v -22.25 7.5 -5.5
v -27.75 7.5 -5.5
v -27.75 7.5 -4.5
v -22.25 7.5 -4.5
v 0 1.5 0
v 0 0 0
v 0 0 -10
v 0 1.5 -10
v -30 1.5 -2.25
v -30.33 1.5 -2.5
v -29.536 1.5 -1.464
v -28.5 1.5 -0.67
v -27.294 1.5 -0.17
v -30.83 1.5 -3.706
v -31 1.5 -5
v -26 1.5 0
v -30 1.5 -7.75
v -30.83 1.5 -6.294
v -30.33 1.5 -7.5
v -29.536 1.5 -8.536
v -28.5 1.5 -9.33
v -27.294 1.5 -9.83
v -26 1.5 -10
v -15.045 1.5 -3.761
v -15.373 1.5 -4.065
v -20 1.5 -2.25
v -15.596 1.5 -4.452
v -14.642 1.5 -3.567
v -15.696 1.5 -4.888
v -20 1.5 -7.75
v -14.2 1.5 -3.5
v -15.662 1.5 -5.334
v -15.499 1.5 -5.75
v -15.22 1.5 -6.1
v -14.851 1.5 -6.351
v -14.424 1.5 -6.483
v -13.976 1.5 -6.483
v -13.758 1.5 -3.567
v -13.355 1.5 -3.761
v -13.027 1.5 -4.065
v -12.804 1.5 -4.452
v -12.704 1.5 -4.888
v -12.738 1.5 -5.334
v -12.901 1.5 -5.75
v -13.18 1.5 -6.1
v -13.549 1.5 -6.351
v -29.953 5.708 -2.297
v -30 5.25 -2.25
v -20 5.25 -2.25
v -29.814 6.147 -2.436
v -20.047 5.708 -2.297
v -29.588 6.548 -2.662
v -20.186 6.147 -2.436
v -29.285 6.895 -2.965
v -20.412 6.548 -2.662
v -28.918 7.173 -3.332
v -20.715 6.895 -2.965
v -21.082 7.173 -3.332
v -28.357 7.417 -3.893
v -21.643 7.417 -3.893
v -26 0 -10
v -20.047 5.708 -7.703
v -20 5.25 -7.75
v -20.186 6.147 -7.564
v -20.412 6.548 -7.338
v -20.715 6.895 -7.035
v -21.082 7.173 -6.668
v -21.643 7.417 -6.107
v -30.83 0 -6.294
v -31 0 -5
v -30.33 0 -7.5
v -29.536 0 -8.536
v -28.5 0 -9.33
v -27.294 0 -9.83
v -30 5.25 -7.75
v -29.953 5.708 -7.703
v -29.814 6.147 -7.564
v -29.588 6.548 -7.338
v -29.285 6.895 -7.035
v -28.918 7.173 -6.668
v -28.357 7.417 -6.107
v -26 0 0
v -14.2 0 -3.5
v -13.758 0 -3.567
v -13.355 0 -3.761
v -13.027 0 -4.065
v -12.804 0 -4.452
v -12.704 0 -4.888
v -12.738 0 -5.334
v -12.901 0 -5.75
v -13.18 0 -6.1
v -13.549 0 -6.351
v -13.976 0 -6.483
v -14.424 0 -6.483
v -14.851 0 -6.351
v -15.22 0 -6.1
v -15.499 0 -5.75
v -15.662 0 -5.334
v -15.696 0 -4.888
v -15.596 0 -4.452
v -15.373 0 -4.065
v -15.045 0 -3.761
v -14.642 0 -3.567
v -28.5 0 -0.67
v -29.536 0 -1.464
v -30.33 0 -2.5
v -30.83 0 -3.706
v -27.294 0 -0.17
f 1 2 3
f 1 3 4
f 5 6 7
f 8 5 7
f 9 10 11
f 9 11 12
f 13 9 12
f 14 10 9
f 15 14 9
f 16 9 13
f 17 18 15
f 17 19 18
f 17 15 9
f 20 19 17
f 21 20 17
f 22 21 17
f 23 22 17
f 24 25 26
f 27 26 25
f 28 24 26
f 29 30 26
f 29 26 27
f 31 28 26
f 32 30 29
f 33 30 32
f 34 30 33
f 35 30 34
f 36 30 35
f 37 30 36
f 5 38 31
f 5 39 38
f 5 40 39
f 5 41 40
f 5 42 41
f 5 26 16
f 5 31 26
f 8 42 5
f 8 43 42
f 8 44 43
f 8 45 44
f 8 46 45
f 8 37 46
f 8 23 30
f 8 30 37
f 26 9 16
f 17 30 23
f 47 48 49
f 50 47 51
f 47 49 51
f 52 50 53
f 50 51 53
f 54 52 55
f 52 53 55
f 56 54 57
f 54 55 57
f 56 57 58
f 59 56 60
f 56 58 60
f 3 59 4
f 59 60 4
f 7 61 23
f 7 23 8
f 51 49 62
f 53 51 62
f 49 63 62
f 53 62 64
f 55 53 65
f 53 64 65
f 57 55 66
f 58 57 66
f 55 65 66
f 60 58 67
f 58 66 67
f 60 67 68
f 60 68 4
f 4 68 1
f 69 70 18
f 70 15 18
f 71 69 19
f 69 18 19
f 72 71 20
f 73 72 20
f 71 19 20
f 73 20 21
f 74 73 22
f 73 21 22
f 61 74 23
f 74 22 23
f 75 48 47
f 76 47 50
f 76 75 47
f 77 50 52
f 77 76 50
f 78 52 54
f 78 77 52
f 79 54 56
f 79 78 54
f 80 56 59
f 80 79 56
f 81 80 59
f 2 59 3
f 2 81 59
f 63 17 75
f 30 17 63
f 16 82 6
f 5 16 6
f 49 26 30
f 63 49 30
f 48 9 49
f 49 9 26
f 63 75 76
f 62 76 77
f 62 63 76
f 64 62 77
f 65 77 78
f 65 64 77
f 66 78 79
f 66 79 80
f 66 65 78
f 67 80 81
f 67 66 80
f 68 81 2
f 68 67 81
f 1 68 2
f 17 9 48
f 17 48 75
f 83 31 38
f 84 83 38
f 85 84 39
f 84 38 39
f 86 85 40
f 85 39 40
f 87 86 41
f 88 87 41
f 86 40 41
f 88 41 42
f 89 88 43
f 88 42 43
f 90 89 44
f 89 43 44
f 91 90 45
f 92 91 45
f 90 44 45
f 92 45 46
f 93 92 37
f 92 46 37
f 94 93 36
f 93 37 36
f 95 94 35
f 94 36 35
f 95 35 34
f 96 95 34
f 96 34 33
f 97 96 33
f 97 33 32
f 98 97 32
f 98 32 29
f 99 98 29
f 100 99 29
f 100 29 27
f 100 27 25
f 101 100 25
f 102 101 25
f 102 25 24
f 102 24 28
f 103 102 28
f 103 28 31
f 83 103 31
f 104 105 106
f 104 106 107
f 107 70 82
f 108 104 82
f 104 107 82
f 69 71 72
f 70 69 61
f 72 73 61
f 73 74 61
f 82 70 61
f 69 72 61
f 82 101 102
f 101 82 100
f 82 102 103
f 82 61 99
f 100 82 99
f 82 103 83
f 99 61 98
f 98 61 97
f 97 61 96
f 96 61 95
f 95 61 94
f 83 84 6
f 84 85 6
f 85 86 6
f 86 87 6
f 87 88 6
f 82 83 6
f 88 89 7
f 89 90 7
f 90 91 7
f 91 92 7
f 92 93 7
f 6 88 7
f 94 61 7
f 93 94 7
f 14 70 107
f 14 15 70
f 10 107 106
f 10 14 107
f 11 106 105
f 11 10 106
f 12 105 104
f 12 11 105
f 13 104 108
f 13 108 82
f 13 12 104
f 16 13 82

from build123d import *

# Parameters (mm, degrees)
SKETCH1_W           = 31
SKETCH1_H           = 10
BOSS_EXTRUDE1_DEPTH = 1.5
CUT_EXTRUDE1_REACH  = 34.608
SKETCH2_R           = 1.5
SKETCH3_W           = 10
SKETCH3_H           = 5.5
BOSS_EXTRUDE2_DEPTH = 6
FILLET3_R           = 2.25
FILLET4_R           = 5


with BuildPart() as part:
    # Sketch1 → Boss-Extrude1 (new body)
    with BuildSketch(Plane(origin=(0, 0, 0), x_dir=(1, 0, 0), z_dir=(0, 1, 0))):
        with Locations((-15.5, 5)):
            Rectangle(SKETCH1_W, SKETCH1_H)
    extrude(amount=BOSS_EXTRUDE1_DEPTH)

    # Sketch2 → Cut-Extrude1 (cut, up to next)
    with BuildSketch(Plane(origin=(0, 1.5, 0), x_dir=(1, 0, 0), z_dir=(0, 1, 0)), mode=Mode.PRIVATE) as cut_extrude1_sk1:
        with Locations(Location((-14.2, 5, 0), (0, 0, 270))):
            Circle(SKETCH2_R)
    cut_extrude1_tool1 = extrude(cut_extrude1_sk1.sketch, amount=-CUT_EXTRUDE1_REACH, mode=Mode.PRIVATE) & part.part
    add(cut_extrude1_tool1.solids().sort_by_distance((-14.2, 1.5, -5))[0], mode=Mode.SUBTRACT)

    # Sketch3 → Boss-Extrude2 (add)
    with BuildSketch(Plane(origin=(0, 1.5, 0), x_dir=(1, 0, 0), z_dir=(0, 1, 0))):
        with Locations((-25, 5)):
            Rectangle(SKETCH3_W, SKETCH3_H)
    extrude(amount=BOSS_EXTRUDE2_DEPTH)

    # Fillet3
    fillet3_edges = [part.edges().sort_by_distance(p)[0] for p in [
        (-30, 7.5, -5),
        (-25, 7.5, -2.25),
        (-20, 7.5, -5),
        (-25, 7.5, -7.75),
    ]]
    fillet(fillet3_edges, radius=FILLET3_R)

    # Fillet4
    fillet4_edges = [part.edges().sort_by_distance(p)[0] for p in [
        (-31, 0.75, 0),
        (-31, 0.75, -10),
    ]]
    fillet(fillet4_edges, radius=FILLET4_R - 0.0001)  # a hair under: the kernel refuses the full size


solid = part.part
